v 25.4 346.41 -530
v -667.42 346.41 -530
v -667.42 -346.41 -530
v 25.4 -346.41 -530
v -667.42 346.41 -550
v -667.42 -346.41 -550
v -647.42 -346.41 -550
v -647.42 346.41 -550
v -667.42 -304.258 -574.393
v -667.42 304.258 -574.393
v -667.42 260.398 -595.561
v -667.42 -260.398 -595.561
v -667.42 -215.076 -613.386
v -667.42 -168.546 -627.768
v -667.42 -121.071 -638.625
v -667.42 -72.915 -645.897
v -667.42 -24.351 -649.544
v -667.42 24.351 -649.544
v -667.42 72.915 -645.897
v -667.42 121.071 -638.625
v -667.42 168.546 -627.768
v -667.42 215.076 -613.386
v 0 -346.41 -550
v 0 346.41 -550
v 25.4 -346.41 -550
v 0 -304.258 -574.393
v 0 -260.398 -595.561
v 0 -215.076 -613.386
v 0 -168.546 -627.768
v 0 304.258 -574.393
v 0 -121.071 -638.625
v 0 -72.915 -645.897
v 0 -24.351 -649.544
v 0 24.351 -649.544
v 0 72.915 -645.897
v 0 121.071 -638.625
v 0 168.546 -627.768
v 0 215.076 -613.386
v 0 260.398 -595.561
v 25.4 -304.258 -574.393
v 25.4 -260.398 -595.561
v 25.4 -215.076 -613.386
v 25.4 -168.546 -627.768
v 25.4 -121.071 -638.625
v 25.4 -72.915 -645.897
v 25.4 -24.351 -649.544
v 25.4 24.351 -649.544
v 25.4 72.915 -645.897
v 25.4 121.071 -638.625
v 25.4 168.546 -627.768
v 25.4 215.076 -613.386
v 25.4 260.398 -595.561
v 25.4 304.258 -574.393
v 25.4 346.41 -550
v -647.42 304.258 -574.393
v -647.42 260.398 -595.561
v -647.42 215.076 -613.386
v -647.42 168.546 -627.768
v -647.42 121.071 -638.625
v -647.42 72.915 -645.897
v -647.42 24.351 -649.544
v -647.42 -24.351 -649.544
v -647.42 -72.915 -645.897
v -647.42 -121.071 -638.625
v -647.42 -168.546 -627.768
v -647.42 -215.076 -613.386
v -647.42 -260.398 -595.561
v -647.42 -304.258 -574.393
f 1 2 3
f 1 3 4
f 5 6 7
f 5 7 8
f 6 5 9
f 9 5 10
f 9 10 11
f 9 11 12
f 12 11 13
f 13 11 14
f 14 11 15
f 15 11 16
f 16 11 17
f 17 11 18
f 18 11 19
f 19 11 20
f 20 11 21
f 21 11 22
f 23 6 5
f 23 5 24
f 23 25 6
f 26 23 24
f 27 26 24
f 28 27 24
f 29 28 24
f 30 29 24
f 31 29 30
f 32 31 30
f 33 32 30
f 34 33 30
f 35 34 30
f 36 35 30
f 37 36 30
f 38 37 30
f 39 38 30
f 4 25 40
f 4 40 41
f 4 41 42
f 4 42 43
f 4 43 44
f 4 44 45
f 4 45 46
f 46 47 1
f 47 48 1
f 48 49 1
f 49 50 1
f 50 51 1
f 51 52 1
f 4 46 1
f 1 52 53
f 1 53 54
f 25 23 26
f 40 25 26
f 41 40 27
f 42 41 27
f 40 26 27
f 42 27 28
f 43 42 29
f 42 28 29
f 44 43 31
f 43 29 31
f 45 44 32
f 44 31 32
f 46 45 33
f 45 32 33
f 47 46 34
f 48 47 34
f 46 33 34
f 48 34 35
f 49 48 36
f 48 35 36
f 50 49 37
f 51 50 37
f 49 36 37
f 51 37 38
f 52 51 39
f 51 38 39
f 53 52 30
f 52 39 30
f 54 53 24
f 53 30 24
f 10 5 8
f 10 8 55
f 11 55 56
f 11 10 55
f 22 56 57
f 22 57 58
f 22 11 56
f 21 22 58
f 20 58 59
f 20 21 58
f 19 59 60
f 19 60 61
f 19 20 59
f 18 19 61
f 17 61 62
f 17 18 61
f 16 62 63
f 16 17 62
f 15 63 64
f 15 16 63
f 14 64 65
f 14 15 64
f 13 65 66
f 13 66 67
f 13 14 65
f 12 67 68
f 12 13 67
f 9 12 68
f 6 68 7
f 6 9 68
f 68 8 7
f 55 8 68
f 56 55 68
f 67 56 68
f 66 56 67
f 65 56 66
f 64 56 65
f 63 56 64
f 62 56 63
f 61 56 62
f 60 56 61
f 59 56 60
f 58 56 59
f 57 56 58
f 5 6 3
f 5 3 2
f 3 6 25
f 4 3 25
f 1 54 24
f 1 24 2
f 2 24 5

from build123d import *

# Parameters (mm, degrees)
F1_DEPTH = 25.4
F2_W     = 692.8203314
F2_H     = 692.8203314
F3_DEPTH = 20
F5_DEPTH = 20


# Not quite as in the source:
# - ends of sketch curves that miss each other by under 0.0002 mm in the source are joined


with BuildPart() as f1:
    # F0 (on Right) → F1 (new body)
    with BuildSketch(Plane.YZ):
        with BuildLine():
            Line((346.4101615138, -550), (-346.4101615138, -550))
            ThreePointArc((-346.4101615138, -550), (0, -650), (346.4101615138, -550))
        make_face()
    extrude(amount=F1_DEPTH)

    # F2 (on face) → F3 (join)
    with BuildSketch(Plane.XY.offset(-550)):
        with Locations((-321.0101657, -4.1862e-06)):
            Rectangle(F2_W, F2_H)
        Polygon((0, -346.4101615138), (0, 346.4101615138), (-667.4203314, 346.4101615138), (-667.4203314, -346.4101698862), align=None)
    extrude(amount=F3_DEPTH)


with BuildPart() as f5:
    # F4 (on face) → F5 (new body)
    with BuildSketch(Plane(origin=(-667.4203314, 0, 0), x_dir=(0, -1, 0), z_dir=(-1, 0, 0))):
        with BuildLine():
            Line((346.4101698862, -550), (-346.4101615138, -550))
            ThreePointArc((-346.4101615138, -550), (3.5422e-06, -650), (346.4101698862, -550))
        make_face()
    extrude(amount=-F5_DEPTH)


solid = Compound([f1.part, f5.part])
